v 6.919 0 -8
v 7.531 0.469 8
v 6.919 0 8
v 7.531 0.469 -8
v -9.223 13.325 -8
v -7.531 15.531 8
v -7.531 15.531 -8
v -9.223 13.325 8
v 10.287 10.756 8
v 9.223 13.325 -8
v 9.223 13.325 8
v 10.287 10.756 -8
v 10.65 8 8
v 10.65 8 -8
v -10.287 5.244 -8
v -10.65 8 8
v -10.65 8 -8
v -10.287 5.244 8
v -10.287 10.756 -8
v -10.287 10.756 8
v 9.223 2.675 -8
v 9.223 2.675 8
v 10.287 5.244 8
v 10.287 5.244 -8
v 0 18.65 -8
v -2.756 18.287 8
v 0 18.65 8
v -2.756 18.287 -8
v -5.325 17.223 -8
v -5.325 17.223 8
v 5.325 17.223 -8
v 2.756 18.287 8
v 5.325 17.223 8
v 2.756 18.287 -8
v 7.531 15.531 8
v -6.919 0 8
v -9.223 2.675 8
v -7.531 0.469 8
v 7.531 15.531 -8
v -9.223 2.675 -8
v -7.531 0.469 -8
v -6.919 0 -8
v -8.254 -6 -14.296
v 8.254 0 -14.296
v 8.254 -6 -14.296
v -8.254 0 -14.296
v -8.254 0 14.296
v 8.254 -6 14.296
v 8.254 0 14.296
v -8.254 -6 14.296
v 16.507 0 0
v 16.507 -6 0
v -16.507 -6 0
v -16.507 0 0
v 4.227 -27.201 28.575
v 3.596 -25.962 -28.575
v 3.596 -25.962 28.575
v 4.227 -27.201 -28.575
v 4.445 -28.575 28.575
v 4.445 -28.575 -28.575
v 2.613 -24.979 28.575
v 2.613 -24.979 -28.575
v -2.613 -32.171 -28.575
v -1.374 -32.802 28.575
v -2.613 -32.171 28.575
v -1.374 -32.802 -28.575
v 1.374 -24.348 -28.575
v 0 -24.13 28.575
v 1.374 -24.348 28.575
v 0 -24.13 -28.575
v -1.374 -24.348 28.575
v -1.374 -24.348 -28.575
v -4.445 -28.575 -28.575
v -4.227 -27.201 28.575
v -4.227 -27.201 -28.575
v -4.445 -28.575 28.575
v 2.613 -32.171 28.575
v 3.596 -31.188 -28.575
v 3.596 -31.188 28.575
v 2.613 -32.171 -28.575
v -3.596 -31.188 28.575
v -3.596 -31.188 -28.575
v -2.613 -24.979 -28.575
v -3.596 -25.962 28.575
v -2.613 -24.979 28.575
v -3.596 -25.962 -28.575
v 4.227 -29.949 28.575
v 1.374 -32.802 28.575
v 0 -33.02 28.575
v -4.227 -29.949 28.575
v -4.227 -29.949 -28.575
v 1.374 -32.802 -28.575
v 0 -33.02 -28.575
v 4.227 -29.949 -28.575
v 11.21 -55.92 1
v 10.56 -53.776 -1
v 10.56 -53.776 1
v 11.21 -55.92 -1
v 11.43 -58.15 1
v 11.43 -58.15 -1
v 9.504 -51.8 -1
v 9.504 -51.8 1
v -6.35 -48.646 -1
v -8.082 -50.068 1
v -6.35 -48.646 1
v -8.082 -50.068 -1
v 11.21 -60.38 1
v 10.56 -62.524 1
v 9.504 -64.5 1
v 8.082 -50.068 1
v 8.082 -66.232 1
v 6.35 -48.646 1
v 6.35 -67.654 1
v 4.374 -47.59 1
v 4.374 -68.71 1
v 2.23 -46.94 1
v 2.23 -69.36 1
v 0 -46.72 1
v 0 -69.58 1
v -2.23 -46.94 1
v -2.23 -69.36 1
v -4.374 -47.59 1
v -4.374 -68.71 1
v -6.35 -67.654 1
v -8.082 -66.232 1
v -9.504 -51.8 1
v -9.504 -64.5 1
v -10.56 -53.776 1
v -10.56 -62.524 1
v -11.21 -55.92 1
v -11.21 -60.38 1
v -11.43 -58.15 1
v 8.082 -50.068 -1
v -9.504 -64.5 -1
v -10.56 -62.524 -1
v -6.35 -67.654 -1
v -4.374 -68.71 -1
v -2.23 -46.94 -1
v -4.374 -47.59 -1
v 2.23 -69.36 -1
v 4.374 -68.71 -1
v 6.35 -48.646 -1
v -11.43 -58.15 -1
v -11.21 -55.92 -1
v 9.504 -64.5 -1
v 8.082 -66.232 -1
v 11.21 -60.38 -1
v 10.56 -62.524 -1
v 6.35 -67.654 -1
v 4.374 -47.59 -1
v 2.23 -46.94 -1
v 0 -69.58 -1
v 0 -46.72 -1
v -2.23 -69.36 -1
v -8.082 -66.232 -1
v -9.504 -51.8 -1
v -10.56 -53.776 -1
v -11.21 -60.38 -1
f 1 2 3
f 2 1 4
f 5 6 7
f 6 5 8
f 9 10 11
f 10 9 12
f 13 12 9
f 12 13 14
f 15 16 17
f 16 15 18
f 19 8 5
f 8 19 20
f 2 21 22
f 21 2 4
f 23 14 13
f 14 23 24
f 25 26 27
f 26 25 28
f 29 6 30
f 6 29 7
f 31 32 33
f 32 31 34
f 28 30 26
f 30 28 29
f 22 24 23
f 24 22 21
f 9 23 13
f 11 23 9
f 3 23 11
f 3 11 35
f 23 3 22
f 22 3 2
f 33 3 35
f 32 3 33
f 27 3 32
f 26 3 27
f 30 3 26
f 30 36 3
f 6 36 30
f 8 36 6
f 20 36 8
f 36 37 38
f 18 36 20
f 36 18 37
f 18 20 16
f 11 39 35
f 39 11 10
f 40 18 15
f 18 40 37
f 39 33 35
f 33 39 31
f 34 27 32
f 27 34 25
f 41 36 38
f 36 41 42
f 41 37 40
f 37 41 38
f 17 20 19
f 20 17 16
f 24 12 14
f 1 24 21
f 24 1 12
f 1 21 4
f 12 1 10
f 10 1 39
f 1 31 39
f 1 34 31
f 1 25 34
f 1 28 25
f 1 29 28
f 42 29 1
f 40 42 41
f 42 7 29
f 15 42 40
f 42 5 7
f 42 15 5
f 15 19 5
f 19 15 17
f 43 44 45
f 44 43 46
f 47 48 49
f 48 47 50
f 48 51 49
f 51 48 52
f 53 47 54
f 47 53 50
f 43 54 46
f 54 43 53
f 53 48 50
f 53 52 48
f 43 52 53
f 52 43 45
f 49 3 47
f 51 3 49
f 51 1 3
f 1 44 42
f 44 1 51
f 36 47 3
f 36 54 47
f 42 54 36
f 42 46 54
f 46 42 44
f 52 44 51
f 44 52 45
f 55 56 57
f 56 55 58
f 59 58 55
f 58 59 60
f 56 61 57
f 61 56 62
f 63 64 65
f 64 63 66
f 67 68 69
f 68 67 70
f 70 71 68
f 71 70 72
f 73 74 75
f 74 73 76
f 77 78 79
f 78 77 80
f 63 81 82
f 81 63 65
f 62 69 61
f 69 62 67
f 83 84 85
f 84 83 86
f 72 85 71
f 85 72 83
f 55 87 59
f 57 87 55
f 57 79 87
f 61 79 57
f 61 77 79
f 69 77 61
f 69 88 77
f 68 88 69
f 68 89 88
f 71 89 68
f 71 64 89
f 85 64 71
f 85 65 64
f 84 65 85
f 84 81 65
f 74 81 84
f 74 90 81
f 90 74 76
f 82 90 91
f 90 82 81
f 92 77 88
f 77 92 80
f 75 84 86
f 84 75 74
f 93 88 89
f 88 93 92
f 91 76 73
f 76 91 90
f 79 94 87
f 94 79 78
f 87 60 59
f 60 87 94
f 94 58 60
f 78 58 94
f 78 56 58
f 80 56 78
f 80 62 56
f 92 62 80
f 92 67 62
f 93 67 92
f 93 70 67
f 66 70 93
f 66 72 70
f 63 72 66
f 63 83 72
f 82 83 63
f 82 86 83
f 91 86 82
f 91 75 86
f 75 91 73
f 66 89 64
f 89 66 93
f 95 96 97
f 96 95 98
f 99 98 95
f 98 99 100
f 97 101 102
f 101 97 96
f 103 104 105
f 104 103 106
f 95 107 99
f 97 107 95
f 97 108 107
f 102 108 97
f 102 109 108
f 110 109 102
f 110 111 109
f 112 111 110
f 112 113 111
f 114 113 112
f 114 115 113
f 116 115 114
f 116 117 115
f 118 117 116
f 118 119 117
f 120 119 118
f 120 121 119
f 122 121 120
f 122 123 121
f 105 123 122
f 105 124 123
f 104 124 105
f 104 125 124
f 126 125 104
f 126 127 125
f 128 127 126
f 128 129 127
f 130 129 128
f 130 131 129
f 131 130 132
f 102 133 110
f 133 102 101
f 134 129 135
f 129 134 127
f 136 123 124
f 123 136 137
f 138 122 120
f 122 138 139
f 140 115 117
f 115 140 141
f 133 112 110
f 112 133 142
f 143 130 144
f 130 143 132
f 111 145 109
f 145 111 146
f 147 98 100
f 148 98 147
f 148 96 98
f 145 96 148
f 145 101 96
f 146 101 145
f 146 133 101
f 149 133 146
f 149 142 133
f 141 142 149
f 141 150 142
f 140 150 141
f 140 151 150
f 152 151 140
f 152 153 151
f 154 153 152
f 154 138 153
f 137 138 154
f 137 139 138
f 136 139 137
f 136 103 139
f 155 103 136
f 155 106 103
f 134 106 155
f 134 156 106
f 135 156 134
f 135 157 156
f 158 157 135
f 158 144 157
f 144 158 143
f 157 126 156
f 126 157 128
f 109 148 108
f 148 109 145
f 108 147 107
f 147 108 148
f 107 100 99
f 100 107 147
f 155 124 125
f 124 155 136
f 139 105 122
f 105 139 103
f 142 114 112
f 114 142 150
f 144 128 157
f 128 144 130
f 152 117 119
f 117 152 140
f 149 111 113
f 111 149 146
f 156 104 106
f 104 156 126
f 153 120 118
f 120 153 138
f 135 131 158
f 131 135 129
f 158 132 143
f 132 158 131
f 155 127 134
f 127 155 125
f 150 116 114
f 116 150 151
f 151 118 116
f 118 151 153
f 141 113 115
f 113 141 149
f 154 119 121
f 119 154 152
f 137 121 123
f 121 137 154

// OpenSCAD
// Auto-generated by scripts/author_from_manifest.py (Phase D.3).
// Source: data/phase_d_manifest.json (sku_intent='tyco-rfii-concealed-155f').
// Do not hand-edit — regenerate from the manifest.
//
// @part tyco_rfii_concealed_155f
// @kind sprinkler_head
// @category head.pendant.k49
// @display-name "Tyco RFII Concealed Residential K4.9 155°F"
// @mfg tyco_fire_protection
// @mfg-pn RFII-C
// @listing UL FM
// @hazard-classes LH
// @price-usd 28.75
// @install-minutes 10
// @crew journeyman
// @k-factor 4.9
// @orientation pendant
// @response quick
// @temperature 155F
// @param size_in number default=0.5 label="Size" unit="in"
// @port inlet position=[0,0.014,0] direction=[0,1,0] style=NPT_threaded size_in=0.5 role=drop

size_in = 0.5;
k_factor = 4.9;

length_mm   = 57.15;
body_dia_mm = 25.40;
thread_od   = 21.3;
thread_len  = 16;
deflector_d = body_dia_mm * 0.9;

 union() {
    translate([0, thread_len/2, 0])
        cylinder(h = thread_len, d = thread_od, center = true, $fn = 24);
    translate([0, -3, 0])
        rotate([90, 0, 0])
        cylinder(h = 6, d = thread_od * 1.55, $fn = 6, center = true);
    translate([0, -length_mm/2, 0])
        cylinder(h = length_mm, d = body_dia_mm * 0.35, center = true, $fn = 20);
    translate([0, -length_mm - 1, 0])
        cylinder(h = 2, d = deflector_d, center = true, $fn = 32);
}
